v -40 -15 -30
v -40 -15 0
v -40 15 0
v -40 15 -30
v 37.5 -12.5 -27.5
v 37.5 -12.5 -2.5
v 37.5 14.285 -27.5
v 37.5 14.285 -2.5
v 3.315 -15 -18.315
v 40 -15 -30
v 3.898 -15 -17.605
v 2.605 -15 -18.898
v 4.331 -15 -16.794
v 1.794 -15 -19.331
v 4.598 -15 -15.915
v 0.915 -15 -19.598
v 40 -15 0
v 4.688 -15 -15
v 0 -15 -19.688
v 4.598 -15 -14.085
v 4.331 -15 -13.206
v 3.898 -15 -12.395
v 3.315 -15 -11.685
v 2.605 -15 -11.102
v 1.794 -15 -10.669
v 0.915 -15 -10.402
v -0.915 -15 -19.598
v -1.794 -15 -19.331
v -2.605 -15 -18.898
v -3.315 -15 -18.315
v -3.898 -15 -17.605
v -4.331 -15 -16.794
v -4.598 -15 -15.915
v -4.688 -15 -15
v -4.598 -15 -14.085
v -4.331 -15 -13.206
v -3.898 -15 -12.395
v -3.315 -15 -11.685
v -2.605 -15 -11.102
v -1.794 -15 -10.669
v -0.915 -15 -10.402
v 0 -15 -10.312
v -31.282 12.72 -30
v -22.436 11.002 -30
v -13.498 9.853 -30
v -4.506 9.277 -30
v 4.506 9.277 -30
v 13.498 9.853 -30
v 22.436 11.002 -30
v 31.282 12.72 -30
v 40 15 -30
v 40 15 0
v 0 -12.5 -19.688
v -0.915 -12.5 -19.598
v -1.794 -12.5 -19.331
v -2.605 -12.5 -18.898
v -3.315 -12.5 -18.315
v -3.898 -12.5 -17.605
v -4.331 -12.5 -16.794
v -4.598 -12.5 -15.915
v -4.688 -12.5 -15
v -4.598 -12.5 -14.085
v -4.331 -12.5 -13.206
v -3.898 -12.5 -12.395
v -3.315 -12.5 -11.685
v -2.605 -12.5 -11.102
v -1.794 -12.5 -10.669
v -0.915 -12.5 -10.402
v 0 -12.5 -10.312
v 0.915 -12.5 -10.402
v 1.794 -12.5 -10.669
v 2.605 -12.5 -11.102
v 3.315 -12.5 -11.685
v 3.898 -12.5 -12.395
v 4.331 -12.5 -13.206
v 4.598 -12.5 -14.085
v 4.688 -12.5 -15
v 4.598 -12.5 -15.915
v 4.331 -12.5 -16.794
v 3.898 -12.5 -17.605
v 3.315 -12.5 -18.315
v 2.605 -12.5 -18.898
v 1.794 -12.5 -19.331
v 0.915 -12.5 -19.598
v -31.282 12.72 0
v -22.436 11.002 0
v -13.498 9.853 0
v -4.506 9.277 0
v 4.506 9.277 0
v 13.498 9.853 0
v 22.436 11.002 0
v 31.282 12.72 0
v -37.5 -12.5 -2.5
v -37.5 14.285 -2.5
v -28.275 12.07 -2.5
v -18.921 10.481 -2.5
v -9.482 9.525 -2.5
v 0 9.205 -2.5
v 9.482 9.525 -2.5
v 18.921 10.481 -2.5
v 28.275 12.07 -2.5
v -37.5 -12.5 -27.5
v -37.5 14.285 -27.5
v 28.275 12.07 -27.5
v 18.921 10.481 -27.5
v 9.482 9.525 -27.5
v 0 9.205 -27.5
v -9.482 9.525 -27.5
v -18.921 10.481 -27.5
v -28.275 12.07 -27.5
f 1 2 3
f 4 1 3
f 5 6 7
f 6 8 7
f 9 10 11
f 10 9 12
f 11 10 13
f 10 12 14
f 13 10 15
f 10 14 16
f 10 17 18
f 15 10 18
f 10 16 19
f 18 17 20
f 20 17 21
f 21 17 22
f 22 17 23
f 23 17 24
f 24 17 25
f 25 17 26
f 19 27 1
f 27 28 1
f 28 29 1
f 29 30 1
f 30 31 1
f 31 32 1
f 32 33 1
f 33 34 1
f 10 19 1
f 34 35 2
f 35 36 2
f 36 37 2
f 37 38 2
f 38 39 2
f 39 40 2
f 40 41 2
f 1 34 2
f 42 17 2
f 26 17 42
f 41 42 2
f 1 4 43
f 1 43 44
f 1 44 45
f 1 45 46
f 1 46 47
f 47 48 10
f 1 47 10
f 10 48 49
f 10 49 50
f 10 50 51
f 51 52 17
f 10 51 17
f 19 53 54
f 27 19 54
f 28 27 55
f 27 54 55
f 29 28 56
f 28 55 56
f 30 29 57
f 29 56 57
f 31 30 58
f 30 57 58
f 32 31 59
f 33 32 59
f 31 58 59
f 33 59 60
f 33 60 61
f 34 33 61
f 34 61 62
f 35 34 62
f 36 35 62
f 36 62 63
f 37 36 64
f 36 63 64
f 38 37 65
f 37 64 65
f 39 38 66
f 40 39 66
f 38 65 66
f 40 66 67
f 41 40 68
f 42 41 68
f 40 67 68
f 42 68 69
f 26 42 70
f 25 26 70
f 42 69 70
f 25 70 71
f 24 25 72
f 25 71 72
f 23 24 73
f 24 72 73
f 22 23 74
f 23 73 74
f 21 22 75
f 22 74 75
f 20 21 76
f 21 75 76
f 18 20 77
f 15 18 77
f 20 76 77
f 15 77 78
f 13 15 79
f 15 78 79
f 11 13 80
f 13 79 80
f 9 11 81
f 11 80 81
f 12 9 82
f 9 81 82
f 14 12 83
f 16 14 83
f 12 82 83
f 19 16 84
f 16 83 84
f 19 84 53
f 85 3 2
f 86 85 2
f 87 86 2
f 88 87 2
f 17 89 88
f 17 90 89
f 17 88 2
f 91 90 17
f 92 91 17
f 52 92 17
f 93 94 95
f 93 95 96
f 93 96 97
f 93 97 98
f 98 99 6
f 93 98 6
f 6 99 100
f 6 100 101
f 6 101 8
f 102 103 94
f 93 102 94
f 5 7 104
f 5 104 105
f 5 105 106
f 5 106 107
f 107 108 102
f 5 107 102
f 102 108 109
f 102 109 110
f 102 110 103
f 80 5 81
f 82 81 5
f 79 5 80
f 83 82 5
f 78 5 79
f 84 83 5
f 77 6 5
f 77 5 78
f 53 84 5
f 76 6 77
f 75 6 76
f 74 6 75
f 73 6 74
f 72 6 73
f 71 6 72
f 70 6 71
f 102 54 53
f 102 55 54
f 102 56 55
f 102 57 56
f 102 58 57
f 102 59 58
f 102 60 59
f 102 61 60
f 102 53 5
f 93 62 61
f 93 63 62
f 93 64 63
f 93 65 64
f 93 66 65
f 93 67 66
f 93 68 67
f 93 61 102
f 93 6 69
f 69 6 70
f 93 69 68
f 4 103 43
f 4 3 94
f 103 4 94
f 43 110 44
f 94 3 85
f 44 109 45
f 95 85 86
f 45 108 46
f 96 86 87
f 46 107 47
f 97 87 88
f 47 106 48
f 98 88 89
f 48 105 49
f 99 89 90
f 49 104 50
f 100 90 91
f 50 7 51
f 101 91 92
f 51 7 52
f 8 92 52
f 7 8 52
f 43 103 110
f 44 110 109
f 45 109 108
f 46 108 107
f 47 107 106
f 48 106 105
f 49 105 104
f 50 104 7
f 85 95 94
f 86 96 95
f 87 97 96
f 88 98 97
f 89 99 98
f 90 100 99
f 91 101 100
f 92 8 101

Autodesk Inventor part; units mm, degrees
ref_plane "YZ Plane" through (0, 0, 0) normal (1, 0, 0) x (0, 1, 0)
ref_plane "XY Plane" through (0, 0, 0) normal (0, 0, 1) x (1, 0, 0)
sketch "Skizze1" plane through (0, 0, 0) normal (0, 0, 1) x (1, 0, 0)
  line L0 (-56, 0) -> (56, 0) projected
  line L1 (0, -48.0323) -> (0, 183.1937) projected
  line L2 (40, 15) -> (40, -15)
  line L3 (40, -15) -> (-40, -15)
  line L4 (-40, -15) -> (-40, 15)
  arc A0 (-40, 15) -> (40, 15) centre (0, 150.1614) ccw
  point P0 (0, 0)
  dimension "d0" = 80
extrude "Extrusion1" add sketch "Skizze1" against normal blind 30
ref_plane "Arbeitsebene1" through (0, 15, 0) normal (0, 1, 0) x (-1, 0, 0)
sketch "Skizze3" plane through (0, 15, 0) normal (0, 1, 0) x (-1, 0, 0)
  line L0 (37.5, -2.5) -> (-37.5, -2.5)
  line L1 (-37.5, -2.5) -> (-37.5, -27.5)
  line L2 (-37.5, -27.5) -> (37.5, -27.5)
  line L3 (37.5, -27.5) -> (37.5, -2.5)
  line L4 (40, 0) -> (40, -30) projected
  line L5 (40, -30) -> (-40, -30) projected
  line L6 (-40, 0) -> (40, 0) projected
  line L7 (-40, 0) -> (-40, -30) projected
  point P0 (0, 0)
  dimension "d9" = 2.5
  dimension "d10" = 2.5
  dimension "d11" = 2.5
  dimension "d12" = 2.5
extrude "Extrusion2" cut sketch "Skizze3" against normal blind 27.5 contours L3 L2 L1 L0
sketch "Skizze4" plane through (-40, -15, 0) normal (0, -1, 0) x (1, 0, 0)
  line L0 (0, 0) -> (0, -30) projected
  line L1 (80, -30) -> (0, -30) projected
  point P0 (40, 0)
  point P1 (40, -15)
  dimension "d15" = 40
  dimension "d16" = 15
hole "Bohrung1" at (0, -15, -15) direction (0, 1, 0) diameter 9.3762 end through all thread size "M11x1.5" class "6H" standard "ISO Metric profile"
properties part number "Wasserablauf"
